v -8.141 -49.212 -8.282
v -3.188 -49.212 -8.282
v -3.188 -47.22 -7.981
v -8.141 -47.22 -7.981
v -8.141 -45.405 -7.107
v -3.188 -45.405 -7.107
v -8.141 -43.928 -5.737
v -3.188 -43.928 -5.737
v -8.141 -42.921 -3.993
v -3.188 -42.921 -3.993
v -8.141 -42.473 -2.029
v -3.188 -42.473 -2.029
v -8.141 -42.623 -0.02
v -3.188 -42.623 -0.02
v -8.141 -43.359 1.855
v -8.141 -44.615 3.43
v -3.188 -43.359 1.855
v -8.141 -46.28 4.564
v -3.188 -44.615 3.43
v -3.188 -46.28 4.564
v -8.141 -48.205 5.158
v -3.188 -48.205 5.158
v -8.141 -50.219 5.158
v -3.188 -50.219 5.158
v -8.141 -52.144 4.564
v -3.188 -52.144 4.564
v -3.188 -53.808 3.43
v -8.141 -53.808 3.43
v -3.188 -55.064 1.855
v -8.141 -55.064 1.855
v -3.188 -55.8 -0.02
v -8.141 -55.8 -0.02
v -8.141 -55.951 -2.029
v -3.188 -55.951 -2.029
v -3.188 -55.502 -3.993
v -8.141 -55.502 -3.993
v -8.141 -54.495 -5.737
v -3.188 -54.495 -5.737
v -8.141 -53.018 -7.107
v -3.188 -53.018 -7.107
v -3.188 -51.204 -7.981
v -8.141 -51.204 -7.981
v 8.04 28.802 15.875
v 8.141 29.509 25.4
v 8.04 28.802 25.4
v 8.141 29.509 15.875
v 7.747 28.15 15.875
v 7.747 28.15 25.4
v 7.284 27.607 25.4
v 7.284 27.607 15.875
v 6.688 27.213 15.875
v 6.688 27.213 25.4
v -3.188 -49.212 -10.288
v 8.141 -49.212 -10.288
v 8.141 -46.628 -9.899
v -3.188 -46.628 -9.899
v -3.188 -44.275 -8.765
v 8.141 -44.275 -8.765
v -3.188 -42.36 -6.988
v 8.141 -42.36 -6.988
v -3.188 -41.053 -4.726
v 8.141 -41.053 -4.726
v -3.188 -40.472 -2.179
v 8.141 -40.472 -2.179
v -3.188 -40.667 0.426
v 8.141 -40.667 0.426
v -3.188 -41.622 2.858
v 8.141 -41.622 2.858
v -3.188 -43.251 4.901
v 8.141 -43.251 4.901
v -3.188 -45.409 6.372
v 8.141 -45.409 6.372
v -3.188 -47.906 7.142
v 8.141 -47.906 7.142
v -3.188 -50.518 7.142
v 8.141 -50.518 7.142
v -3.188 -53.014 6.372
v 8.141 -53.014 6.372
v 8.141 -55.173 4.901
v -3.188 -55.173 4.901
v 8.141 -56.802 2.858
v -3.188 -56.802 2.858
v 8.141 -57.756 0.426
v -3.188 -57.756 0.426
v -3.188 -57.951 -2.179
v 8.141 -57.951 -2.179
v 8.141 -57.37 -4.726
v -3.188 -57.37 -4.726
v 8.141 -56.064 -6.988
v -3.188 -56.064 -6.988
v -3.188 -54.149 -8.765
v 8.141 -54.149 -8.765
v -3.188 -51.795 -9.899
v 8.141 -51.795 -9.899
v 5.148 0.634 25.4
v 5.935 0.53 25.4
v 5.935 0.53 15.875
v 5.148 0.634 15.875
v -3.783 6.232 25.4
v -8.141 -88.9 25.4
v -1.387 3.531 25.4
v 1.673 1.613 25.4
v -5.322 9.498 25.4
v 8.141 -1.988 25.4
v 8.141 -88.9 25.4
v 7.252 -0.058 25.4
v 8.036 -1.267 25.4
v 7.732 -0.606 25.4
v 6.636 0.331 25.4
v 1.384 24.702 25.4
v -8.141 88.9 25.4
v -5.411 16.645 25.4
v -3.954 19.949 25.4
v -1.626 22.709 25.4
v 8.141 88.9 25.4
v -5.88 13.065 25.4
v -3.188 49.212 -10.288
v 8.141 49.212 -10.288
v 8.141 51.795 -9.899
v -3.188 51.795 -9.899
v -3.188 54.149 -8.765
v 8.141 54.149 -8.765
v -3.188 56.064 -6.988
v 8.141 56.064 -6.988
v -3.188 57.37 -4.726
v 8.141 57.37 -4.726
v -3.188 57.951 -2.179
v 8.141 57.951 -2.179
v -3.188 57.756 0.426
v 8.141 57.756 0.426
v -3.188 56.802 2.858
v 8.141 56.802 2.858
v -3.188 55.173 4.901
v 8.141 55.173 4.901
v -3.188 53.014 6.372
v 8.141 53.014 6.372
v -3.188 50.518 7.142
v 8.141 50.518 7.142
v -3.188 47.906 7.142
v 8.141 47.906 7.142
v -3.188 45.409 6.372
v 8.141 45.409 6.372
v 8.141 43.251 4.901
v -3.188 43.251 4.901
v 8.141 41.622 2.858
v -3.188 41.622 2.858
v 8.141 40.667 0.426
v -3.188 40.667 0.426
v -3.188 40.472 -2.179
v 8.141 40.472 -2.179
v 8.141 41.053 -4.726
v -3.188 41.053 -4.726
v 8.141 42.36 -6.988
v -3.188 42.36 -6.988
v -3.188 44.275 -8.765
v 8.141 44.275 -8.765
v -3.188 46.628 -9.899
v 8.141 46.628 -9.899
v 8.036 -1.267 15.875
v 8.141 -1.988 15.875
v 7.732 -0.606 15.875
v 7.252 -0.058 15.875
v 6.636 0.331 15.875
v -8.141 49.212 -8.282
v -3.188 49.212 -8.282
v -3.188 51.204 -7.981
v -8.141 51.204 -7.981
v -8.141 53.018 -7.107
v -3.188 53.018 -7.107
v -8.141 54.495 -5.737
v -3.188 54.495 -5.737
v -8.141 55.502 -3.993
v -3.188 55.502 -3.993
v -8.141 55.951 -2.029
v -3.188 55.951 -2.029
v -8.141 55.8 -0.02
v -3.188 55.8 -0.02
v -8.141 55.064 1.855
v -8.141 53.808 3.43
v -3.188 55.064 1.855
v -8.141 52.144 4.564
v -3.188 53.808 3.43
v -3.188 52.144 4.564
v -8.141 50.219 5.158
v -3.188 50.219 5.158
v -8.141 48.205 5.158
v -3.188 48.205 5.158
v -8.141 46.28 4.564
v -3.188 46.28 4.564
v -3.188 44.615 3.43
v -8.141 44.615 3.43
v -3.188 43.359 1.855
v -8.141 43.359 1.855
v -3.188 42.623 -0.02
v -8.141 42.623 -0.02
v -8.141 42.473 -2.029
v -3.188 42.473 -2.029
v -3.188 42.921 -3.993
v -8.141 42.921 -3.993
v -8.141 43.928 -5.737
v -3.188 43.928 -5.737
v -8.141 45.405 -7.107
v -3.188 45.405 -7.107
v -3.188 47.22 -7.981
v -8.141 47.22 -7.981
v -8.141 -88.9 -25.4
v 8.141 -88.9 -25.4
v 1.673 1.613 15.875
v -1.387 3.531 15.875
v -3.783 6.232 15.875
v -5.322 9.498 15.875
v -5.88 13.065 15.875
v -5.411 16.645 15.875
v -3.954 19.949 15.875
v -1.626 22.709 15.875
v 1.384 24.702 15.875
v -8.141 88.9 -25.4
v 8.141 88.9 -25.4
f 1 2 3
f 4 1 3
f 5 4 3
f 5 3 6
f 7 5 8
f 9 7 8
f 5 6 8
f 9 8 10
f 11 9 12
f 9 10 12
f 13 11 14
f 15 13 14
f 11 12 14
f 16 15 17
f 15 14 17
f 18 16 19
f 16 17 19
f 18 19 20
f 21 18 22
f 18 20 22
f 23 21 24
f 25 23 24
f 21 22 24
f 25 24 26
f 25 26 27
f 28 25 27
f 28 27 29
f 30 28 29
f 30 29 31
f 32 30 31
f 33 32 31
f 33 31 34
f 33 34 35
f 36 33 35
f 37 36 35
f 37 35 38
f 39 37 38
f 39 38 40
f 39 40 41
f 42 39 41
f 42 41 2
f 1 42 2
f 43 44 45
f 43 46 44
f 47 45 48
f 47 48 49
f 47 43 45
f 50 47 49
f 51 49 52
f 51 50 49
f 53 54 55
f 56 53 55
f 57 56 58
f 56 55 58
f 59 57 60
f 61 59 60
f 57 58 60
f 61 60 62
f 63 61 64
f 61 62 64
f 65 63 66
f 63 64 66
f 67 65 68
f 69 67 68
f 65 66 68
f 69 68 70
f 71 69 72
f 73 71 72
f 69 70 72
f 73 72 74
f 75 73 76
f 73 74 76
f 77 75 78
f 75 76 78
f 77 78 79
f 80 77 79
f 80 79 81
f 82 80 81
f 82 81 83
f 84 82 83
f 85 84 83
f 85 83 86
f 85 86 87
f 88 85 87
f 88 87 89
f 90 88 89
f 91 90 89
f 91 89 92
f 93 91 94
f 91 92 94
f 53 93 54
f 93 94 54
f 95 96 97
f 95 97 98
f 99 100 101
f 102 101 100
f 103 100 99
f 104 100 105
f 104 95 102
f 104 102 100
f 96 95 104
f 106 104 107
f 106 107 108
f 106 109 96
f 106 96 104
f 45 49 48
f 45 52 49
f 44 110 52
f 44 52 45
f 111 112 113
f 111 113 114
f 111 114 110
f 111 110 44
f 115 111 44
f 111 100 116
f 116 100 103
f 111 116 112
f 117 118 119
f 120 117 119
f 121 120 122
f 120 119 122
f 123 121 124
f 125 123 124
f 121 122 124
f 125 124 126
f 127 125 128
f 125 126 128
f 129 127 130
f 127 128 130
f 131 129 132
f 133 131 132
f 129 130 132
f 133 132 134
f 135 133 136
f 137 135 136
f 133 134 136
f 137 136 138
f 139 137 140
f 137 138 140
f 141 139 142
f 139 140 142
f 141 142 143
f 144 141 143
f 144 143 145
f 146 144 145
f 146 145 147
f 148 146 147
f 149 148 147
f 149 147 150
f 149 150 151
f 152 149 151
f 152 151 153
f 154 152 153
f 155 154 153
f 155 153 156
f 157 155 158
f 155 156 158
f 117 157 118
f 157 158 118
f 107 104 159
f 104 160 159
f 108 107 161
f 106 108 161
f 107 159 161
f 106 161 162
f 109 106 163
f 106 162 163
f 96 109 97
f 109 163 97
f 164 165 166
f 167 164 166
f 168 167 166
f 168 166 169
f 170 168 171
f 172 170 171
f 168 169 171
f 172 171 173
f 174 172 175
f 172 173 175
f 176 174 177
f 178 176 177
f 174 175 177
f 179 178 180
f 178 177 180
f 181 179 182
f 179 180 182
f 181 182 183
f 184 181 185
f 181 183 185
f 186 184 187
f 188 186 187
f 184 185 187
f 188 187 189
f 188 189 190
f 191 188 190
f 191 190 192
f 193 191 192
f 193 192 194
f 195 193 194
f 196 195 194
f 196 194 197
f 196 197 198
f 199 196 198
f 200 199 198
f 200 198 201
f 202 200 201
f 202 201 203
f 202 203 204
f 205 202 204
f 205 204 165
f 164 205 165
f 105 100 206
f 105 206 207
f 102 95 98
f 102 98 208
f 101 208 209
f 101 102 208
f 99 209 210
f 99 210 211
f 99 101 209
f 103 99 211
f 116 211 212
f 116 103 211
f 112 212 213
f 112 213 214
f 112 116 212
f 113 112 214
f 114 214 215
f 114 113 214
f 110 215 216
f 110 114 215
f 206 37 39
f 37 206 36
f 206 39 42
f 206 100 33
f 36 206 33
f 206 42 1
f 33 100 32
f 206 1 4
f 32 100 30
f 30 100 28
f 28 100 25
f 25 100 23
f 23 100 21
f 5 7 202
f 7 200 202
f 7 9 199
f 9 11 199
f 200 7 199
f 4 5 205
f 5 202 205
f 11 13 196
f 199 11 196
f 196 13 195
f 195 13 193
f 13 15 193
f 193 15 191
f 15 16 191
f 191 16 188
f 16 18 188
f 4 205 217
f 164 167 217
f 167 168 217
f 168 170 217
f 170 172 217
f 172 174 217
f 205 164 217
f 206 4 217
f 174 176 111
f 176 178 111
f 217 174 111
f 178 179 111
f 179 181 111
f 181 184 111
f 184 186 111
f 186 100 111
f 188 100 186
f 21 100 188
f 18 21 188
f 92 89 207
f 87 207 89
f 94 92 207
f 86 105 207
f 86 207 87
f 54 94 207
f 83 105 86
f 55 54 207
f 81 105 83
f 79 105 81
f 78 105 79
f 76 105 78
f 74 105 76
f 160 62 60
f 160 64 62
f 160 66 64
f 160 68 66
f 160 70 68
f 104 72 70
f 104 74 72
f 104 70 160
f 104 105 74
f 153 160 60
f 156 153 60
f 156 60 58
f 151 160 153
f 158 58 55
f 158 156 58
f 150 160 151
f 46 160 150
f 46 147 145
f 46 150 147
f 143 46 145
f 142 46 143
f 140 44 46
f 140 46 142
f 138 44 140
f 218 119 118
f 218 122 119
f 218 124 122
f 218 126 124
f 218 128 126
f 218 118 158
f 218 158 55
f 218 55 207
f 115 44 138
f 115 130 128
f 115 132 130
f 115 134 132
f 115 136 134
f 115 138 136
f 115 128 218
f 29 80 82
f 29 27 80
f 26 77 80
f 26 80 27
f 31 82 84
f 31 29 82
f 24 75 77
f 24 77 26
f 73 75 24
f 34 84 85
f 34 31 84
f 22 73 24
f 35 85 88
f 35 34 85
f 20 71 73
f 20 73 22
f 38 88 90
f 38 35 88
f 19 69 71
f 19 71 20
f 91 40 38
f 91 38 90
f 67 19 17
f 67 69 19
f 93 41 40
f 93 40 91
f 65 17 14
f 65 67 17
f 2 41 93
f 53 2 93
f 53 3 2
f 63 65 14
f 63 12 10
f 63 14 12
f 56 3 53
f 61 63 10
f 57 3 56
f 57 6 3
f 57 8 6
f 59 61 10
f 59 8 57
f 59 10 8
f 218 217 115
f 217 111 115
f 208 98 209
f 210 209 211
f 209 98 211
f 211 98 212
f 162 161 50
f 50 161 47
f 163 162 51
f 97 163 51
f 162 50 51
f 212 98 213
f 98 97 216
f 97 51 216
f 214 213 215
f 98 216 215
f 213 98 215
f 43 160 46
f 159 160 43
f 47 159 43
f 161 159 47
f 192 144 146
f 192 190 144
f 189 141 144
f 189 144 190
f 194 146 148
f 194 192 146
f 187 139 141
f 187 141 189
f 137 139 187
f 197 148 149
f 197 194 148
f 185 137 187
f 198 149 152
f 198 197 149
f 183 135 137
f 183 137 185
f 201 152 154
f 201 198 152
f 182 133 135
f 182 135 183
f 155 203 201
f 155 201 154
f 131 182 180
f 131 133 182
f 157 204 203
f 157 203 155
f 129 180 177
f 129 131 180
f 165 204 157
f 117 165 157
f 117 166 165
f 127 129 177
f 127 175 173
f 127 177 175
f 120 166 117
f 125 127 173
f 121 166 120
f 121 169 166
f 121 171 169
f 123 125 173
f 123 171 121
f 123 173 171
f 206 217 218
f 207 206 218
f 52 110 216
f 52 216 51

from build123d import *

# Parameters (mm, degrees)
SKETCH1_W           = 16.2814
SKETCH1_H           = 177.8
BOSS_EXTRUDE1_DEPTH = 25.4
SKETCH2_R           = 6.75767
CUT_EXTRUDE1_DEPTH  = 94.879997795
SKETCH3_R           = 8.7641176
CUT_EXTRUDE2_DEPTH  = 11.3284
CUT_EXTRUDE3_DEPTH  = 9.525
FILLET1_R           = 2.54


with BuildPart() as part:
    # Sketch1 → Boss-Extrude1 (new, symmetric)
    with BuildSketch(Plane.XY):
        Rectangle(SKETCH1_W, SKETCH1_H)
    extrude(amount=BOSS_EXTRUDE1_DEPTH, both=True)

    # Sketch2 → Cut-Extrude1 (cut, through all)
    with BuildSketch(Plane(origin=(8.1407, 0, 0), x_dir=(0, 0, -1), z_dir=(1, 0, 0))):
        with Locations((1.524, 49.211738)):
            Circle(SKETCH2_R)
        with Locations((1.524, -49.211738)):
            Circle(SKETCH2_R)
    extrude(amount=-CUT_EXTRUDE1_DEPTH, mode=Mode.SUBTRACT)

    # Sketch3 → Cut-Extrude2 (cut)
    with BuildSketch(Plane(origin=(8.1407, 0, 0), x_dir=(0, 0, -1), z_dir=(1, 0, 0))):
        with Locations((1.524, 49.211738)):
            Circle(SKETCH3_R)
        with Locations((1.524, -49.211738)):
            Circle(SKETCH3_R)
    extrude(amount=-CUT_EXTRUDE2_DEPTH, mode=Mode.SUBTRACT)

    # Sketch5 → Cut-Extrude3 (cut)
    with BuildSketch(Plane.XY.offset(25.4)):
        with BuildLine():
            Line((1.3843, 24.702073714), (8.1407, 27.901182182))
            Line((8.1407, 27.901182182), (8.1407, 0.236876892))
            Line((8.1407, 0.236876892), (5.147798748, 0.634218973))
            ThreePointArc((5.147798748, 0.634218973), (-5.728317972, 11.261694019), (1.3843, 24.702073714))
        make_face()
    extrude(amount=-CUT_EXTRUDE3_DEPTH, mode=Mode.SUBTRACT)

    # Fillet1
    fillet1_edges = [part.edges().sort_by_distance(p)[0] for p in [
        (8.1407, 27.901182182, 20.6375),
        (8.1407, 0.236876892, 20.6375),
    ]]
    fillet(fillet1_edges, radius=FILLET1_R)


solid = part.part
